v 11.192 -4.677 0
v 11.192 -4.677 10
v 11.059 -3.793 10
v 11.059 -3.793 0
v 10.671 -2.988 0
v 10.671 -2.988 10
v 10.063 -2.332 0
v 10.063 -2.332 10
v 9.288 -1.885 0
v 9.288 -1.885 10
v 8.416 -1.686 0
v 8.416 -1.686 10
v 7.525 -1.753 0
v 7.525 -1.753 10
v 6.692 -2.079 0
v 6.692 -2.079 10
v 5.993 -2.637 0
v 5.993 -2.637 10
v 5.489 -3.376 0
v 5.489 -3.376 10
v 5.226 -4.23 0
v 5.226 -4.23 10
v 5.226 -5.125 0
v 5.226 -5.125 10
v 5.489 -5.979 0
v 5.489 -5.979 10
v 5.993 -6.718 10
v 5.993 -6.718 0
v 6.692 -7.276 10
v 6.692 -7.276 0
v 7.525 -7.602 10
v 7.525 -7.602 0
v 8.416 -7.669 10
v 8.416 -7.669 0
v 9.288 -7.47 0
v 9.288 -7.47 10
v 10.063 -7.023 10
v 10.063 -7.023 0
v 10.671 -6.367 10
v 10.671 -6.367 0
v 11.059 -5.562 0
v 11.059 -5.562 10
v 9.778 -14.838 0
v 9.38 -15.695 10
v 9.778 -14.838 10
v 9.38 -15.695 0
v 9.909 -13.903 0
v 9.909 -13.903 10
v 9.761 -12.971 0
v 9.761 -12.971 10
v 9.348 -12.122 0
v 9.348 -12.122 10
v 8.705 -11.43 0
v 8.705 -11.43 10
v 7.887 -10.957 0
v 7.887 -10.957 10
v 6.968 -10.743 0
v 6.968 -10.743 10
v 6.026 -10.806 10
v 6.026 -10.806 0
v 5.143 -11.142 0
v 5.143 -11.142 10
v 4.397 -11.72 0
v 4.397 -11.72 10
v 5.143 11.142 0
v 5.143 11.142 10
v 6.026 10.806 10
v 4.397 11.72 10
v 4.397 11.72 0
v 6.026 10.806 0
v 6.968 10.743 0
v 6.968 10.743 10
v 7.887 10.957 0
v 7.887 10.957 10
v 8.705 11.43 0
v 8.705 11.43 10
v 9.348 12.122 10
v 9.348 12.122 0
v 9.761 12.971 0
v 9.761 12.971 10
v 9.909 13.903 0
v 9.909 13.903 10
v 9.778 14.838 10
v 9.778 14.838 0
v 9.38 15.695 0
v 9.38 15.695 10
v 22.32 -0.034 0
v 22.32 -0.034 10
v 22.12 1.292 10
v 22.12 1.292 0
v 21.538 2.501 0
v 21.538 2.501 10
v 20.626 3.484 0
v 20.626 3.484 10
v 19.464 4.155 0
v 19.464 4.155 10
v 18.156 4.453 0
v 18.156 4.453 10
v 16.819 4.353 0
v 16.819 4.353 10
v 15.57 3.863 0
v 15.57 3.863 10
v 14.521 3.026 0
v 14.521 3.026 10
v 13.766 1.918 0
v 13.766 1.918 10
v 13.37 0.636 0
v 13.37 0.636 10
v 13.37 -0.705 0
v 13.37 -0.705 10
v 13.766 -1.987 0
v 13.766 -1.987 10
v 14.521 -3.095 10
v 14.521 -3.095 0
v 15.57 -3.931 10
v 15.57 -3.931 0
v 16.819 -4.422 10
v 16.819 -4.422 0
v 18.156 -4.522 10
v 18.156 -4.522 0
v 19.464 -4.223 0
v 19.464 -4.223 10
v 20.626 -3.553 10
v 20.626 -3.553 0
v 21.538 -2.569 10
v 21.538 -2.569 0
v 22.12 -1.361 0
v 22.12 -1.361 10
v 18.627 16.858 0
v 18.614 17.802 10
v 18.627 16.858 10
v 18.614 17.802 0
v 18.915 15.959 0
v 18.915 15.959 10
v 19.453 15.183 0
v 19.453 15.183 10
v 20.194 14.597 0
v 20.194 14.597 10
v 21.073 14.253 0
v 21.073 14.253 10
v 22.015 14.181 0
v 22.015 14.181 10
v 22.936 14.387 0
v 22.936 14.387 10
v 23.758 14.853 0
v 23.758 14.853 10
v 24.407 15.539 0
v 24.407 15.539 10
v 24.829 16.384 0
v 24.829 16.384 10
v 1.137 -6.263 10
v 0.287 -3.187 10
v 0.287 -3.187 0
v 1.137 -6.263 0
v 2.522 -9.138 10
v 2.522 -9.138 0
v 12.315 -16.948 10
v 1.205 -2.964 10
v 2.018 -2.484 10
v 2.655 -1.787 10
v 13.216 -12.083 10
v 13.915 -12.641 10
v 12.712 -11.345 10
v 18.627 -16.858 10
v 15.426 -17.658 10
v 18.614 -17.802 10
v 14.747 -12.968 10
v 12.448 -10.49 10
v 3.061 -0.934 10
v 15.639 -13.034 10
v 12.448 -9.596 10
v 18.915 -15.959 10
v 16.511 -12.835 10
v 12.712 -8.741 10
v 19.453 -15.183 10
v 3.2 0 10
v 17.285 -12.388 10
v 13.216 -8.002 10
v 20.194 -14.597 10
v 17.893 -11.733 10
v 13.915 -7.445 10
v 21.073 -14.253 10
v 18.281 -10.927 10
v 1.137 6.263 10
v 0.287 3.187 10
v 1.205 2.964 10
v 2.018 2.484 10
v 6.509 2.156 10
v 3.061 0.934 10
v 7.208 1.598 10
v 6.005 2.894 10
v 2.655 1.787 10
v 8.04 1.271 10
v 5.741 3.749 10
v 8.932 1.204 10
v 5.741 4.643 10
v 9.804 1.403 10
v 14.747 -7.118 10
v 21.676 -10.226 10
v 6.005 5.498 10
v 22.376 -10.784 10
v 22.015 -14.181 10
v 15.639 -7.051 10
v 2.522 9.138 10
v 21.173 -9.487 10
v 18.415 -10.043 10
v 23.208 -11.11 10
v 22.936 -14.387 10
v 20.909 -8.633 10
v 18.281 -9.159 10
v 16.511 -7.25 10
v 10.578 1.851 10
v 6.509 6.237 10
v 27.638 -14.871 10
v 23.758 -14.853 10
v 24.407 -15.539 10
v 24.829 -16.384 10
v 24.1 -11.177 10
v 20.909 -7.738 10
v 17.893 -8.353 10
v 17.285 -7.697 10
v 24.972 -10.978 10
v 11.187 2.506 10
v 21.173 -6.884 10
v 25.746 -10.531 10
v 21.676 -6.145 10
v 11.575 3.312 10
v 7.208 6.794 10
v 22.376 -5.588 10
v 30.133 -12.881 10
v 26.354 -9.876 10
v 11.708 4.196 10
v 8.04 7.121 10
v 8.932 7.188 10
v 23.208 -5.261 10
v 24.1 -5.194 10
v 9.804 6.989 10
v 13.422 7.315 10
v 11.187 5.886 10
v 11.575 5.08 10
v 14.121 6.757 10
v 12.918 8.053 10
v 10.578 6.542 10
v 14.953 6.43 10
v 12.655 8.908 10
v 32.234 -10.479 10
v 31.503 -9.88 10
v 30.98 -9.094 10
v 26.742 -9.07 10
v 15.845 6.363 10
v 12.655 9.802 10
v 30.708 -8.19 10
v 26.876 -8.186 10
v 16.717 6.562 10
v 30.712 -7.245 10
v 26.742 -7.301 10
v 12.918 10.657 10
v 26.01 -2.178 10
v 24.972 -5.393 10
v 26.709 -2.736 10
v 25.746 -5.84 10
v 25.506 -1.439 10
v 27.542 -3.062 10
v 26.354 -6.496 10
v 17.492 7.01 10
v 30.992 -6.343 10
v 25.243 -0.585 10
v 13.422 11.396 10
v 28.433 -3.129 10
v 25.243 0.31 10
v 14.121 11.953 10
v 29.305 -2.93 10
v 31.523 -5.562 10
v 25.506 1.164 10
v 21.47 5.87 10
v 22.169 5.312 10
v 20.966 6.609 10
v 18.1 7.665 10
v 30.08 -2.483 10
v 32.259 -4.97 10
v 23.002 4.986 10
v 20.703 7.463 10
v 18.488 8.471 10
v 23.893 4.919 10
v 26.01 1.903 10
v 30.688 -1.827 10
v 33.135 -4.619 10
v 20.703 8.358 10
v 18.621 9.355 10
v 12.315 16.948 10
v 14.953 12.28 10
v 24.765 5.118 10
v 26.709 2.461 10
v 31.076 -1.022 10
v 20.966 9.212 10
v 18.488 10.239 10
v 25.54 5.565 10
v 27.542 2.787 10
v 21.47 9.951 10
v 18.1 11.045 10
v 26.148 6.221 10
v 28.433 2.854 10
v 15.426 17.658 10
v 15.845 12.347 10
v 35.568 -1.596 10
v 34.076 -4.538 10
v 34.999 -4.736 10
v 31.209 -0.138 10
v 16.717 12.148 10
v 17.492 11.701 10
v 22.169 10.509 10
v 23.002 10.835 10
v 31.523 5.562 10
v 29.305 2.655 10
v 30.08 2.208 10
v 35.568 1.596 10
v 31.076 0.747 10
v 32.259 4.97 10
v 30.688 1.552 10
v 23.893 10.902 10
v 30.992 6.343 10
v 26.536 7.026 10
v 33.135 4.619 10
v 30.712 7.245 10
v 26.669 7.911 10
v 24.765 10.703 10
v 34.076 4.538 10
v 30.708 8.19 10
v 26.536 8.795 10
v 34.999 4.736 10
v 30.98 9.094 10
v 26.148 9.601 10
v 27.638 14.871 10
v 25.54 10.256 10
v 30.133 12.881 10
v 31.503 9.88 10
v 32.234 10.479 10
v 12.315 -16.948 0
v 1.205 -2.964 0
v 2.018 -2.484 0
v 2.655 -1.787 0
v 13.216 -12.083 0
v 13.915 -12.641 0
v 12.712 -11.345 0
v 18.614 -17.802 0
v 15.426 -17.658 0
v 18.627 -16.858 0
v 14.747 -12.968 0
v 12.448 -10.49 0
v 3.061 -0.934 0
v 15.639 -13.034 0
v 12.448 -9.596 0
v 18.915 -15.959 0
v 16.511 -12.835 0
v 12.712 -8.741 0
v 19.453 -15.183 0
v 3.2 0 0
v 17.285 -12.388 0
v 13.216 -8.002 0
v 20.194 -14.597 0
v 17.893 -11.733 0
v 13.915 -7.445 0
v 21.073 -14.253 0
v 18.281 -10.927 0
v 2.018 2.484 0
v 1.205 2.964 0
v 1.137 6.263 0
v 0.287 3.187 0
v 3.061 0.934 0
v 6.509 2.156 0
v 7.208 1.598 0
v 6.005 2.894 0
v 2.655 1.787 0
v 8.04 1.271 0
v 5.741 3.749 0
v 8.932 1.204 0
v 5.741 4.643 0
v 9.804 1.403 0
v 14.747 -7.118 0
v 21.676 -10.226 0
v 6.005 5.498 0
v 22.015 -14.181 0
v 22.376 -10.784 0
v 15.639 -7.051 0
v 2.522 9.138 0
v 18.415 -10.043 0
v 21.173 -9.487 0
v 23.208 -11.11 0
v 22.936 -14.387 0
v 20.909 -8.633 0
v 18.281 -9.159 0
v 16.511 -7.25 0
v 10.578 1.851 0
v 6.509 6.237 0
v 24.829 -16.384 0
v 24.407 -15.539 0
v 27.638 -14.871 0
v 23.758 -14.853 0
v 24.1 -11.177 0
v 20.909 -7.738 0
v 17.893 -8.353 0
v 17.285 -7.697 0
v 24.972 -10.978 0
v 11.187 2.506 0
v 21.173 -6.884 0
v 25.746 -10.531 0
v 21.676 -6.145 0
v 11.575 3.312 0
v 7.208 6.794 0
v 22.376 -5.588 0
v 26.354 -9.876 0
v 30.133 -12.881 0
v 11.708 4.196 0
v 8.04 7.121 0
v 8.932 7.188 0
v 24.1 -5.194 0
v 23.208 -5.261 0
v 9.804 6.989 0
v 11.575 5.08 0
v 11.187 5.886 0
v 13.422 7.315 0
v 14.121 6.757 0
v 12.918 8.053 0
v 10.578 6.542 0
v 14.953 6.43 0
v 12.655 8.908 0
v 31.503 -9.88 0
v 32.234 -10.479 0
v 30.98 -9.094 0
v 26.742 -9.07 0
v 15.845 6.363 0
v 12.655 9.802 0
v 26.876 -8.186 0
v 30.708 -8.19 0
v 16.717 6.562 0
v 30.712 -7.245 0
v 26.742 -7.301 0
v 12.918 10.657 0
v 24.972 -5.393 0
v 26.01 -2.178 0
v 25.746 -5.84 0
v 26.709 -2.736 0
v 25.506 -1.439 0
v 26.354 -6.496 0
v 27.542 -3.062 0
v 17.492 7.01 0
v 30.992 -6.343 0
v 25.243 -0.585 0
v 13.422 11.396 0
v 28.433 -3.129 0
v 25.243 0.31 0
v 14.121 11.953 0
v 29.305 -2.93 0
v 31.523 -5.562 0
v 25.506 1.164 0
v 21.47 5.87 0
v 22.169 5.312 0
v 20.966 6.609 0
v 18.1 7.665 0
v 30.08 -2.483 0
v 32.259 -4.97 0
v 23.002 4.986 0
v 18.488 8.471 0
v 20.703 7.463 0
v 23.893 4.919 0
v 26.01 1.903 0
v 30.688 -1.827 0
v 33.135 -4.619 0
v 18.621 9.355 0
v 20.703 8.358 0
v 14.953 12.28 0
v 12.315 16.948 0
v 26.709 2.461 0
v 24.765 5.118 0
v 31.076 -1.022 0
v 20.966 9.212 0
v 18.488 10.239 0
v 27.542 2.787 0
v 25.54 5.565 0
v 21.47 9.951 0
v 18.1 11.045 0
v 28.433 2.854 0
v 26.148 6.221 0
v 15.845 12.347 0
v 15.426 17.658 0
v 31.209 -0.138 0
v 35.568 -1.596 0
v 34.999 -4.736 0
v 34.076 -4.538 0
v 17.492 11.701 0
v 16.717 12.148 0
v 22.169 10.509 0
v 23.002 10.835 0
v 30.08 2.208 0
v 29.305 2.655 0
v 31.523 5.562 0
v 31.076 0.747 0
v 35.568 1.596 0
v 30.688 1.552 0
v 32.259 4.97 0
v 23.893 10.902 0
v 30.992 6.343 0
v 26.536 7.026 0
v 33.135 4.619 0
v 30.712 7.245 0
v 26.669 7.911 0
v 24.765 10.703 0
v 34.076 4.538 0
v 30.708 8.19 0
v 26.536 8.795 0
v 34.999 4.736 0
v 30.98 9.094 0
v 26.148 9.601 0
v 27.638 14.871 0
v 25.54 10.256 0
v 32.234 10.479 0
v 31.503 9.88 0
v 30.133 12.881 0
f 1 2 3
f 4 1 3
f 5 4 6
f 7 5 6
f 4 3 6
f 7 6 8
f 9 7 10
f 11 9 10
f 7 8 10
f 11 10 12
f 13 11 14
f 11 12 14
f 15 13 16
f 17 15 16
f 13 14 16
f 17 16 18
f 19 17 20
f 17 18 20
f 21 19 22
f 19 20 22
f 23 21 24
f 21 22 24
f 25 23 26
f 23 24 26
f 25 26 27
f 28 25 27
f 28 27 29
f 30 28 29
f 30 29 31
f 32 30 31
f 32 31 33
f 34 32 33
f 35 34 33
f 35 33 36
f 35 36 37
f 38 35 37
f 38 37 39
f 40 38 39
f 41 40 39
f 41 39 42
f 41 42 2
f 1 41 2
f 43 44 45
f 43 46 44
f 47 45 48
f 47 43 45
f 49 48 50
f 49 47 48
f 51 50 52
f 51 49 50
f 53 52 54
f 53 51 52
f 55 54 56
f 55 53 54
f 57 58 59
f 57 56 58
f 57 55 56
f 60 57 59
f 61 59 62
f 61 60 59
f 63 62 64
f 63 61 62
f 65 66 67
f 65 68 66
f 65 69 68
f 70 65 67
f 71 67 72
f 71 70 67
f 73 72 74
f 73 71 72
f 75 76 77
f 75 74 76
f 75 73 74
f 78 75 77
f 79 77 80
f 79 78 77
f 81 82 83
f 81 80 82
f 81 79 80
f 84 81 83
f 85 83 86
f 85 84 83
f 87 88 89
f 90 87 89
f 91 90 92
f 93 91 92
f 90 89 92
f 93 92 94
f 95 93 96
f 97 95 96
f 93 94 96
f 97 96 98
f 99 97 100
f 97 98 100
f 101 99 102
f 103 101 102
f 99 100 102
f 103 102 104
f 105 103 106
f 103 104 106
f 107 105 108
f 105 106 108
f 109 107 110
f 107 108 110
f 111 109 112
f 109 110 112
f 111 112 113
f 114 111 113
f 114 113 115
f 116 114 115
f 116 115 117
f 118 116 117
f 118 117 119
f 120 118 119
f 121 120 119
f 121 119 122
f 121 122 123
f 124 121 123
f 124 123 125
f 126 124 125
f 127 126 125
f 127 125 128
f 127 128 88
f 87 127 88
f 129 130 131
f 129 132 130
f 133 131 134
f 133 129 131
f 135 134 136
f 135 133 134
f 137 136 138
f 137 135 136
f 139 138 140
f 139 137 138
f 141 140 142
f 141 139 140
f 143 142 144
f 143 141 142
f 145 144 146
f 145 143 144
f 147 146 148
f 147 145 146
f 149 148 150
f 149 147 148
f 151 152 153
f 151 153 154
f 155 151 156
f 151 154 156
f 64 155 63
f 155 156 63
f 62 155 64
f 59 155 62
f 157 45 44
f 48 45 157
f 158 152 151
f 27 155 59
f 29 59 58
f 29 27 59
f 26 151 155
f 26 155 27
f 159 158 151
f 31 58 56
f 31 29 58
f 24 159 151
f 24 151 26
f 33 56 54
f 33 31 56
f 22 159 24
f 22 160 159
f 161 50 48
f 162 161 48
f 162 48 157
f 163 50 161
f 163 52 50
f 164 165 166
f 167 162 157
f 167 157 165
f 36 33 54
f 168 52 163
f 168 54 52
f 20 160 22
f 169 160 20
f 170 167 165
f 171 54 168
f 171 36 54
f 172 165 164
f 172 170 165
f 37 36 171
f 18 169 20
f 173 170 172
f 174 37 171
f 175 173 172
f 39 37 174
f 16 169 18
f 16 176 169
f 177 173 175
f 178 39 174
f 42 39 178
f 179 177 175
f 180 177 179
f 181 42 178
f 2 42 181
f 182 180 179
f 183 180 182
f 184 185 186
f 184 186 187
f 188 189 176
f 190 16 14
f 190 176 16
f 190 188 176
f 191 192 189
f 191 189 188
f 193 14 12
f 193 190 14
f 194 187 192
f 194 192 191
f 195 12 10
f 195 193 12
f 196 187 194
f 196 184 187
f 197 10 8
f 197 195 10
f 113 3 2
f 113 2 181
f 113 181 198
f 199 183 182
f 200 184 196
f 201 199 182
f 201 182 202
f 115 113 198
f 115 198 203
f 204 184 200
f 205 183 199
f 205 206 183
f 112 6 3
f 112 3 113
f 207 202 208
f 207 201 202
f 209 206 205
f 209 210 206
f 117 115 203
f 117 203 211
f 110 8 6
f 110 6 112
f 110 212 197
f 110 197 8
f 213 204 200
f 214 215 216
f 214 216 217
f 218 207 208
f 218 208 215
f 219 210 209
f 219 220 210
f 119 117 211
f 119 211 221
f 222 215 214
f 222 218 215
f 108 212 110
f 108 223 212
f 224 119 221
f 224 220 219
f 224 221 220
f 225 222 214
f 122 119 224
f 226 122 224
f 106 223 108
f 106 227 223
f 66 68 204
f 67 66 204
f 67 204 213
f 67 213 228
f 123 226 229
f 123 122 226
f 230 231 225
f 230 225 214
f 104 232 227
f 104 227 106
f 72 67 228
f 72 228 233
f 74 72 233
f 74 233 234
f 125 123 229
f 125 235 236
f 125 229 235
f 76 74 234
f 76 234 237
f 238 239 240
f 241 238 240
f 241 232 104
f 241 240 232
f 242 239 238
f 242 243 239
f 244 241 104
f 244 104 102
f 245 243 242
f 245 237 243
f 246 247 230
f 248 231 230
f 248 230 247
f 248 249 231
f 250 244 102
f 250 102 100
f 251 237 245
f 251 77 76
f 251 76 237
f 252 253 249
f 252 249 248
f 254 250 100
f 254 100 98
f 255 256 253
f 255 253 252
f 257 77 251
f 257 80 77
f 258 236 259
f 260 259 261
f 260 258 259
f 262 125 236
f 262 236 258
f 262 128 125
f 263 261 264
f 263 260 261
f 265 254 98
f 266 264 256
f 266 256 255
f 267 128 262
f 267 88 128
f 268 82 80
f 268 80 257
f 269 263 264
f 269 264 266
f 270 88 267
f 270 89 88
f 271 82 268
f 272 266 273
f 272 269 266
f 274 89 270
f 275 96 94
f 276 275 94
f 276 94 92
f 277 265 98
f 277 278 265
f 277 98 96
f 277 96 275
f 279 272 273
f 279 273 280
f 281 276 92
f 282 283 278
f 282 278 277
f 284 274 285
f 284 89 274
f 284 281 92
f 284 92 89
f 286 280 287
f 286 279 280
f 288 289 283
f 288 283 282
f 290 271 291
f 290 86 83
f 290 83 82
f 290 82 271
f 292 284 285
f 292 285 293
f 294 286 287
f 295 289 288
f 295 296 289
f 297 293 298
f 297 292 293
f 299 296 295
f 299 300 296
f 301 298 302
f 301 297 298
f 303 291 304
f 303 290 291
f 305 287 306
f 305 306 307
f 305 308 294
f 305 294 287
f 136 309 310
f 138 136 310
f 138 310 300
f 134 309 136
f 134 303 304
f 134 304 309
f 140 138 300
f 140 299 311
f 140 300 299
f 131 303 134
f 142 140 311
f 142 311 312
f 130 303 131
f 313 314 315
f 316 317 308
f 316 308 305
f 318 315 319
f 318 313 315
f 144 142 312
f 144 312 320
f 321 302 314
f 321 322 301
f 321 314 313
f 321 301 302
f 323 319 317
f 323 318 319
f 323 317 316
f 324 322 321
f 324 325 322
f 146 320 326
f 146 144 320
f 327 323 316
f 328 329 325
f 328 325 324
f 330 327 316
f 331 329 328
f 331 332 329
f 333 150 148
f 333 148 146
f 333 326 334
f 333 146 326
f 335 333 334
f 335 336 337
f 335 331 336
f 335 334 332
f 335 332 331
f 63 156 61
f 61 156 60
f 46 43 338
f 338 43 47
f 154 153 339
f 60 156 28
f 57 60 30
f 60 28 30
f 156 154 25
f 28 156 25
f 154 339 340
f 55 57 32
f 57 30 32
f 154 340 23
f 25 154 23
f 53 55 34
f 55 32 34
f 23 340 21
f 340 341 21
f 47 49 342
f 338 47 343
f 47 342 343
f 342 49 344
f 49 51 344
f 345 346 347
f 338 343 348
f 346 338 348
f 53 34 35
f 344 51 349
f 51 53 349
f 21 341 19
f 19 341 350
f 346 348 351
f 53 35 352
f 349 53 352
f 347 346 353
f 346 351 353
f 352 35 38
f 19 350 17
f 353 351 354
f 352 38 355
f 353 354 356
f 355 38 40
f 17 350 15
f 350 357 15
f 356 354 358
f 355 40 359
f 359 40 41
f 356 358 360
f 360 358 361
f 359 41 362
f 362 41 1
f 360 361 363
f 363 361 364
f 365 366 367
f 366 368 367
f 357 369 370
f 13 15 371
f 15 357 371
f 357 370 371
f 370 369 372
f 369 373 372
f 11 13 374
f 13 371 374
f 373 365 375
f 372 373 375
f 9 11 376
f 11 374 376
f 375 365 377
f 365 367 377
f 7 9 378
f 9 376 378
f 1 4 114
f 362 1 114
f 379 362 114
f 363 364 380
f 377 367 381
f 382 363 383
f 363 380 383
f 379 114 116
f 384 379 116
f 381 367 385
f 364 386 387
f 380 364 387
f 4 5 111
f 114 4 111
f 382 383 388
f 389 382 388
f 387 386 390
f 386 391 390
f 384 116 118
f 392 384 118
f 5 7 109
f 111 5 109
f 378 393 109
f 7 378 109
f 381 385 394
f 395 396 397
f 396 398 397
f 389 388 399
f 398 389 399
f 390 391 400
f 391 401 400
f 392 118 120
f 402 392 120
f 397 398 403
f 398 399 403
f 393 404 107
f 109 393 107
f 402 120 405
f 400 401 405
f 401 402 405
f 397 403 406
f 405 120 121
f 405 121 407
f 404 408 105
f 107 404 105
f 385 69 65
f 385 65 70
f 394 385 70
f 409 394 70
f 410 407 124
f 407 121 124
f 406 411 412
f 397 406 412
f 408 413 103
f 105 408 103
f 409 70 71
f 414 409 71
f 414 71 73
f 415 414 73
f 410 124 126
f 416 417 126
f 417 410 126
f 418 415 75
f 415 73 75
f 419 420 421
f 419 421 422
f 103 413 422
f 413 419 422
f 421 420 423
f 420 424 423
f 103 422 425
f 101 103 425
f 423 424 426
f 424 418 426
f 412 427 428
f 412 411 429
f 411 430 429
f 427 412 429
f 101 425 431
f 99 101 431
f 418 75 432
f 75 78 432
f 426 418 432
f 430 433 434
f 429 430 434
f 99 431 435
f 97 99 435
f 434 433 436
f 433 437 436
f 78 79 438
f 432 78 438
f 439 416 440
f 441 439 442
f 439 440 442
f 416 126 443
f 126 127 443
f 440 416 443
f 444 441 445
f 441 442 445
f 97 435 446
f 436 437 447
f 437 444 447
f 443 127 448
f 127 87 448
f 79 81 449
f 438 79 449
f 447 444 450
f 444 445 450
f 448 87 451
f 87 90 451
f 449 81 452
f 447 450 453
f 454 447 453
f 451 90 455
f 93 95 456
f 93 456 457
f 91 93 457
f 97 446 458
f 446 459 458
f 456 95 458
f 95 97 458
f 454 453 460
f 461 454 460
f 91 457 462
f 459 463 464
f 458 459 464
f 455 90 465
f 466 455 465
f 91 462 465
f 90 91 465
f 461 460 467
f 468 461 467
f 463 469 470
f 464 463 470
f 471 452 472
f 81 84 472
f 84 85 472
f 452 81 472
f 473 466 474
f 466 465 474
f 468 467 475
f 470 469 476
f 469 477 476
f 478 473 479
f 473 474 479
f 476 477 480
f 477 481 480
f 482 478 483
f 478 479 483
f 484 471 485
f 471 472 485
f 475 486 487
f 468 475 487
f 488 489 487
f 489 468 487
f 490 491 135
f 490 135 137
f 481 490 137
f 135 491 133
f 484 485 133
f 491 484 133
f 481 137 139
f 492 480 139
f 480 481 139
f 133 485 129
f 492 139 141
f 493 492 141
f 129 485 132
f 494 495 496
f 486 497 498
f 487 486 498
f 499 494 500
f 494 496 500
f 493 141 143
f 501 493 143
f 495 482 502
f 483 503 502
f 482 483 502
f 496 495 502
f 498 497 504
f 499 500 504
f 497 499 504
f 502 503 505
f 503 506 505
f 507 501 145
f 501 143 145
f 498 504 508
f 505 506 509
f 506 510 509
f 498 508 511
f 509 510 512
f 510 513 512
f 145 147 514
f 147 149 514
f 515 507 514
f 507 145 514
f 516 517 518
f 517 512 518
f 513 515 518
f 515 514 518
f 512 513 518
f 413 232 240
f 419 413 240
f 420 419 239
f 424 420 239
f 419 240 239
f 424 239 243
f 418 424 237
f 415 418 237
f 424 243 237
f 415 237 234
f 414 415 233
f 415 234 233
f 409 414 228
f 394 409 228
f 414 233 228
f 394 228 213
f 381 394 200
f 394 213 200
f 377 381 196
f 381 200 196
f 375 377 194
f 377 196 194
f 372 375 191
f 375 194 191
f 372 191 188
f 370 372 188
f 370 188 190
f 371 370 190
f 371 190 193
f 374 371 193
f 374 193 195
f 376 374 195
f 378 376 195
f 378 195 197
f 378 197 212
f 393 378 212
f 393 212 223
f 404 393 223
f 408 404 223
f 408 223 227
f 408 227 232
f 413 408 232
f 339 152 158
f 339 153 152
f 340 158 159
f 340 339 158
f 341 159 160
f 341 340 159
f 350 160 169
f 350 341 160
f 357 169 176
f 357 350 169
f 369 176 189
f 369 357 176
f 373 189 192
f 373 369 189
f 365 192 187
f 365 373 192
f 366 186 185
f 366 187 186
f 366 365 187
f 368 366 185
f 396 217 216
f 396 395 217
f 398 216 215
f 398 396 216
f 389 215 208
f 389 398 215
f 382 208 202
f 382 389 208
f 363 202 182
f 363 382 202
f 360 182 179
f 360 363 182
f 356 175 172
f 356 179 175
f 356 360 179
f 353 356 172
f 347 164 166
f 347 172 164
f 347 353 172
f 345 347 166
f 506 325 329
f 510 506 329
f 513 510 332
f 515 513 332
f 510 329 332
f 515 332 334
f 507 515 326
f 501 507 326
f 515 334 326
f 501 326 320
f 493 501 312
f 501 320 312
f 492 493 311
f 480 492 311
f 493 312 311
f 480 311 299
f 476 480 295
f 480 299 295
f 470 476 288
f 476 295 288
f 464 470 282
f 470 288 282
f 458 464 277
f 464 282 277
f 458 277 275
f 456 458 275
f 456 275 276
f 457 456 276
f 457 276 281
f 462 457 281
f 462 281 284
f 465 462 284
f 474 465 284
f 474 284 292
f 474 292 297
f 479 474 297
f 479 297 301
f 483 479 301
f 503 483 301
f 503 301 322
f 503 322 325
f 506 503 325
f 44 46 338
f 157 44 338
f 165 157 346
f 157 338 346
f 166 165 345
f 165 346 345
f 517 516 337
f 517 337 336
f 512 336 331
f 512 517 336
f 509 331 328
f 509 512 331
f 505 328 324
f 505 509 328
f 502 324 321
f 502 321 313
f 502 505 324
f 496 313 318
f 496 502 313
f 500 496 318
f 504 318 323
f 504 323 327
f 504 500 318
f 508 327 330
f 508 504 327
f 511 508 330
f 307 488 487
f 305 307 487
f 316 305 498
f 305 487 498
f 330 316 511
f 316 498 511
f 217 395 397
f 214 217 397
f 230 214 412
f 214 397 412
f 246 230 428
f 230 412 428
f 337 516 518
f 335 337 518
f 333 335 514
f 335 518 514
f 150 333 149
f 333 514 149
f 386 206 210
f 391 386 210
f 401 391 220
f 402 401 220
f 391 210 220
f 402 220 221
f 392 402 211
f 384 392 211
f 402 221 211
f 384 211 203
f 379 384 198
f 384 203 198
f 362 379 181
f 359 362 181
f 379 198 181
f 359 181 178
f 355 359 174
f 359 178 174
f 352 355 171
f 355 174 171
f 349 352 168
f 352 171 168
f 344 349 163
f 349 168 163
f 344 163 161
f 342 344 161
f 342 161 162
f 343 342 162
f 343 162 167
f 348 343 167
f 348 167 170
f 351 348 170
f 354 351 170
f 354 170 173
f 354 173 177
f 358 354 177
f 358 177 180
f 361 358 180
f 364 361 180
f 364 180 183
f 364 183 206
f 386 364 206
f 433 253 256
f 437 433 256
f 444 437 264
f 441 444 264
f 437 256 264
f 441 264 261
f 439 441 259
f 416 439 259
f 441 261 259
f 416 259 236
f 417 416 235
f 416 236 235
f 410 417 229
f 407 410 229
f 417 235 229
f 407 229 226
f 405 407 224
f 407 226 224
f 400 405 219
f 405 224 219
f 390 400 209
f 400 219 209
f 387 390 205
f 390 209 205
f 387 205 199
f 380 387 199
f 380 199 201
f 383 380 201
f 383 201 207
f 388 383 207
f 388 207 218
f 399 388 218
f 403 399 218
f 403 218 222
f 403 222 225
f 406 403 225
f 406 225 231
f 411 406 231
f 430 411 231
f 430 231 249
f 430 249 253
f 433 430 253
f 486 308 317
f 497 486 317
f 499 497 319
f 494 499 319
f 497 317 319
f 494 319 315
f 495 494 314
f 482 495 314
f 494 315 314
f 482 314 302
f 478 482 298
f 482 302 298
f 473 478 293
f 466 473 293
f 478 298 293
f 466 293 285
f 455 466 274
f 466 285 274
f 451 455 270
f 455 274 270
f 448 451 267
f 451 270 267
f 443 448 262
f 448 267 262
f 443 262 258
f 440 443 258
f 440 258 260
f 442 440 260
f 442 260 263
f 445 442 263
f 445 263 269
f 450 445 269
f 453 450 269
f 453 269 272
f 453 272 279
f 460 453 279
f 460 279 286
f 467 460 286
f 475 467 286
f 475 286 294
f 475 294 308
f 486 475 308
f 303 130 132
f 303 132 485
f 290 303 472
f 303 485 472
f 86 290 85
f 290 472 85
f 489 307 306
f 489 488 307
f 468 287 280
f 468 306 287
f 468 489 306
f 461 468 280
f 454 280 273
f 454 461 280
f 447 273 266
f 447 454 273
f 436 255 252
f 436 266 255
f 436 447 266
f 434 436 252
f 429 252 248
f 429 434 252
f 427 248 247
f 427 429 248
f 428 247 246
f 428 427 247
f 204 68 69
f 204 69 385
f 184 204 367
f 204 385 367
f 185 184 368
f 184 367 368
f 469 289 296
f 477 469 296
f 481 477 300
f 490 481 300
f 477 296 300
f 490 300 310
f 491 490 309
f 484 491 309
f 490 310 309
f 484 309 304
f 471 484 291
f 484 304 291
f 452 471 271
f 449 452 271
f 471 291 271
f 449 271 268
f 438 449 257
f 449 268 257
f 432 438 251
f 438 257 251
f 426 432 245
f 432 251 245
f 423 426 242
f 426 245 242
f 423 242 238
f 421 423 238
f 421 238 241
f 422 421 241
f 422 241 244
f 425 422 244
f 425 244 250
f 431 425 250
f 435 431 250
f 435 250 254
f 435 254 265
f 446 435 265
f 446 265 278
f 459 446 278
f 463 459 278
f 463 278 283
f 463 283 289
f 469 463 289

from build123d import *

# Parameters (mm, degrees)
CYLINDER_R        = 3.2
CYLINDER_DEPTH    = 10
ARRAY_COUNT       = 7
CYLINDER001_R     = 17.82
CYLINDER001_DEPTH = 10
SKETCH001_R       = 4.5
SKETCH001_R_2     = 3
POCKET_DEPTH      = 10.001


with BuildPart() as dientes:
    # Cylinder → Cylinder (new body)
    with BuildSketch(Plane.XY):
        Circle(CYLINDER_R)
    extrude(amount=CYLINDER_DEPTH)

    # Array: Dientes ×7 about axis
    array_axis = Axis((17.82, 0, 0), (0, 0, 1))


with BuildPart() as dientes_1:
    add(dientes.part)
    for i in range(1, ARRAY_COUNT):
        add(dientes.part.rotate(array_axis, i * 360 / ARRAY_COUNT))


with BuildPart() as base001_aligerado_con_agujeros:
    # Cylinder001 → Cylinder001 (new body)
    with BuildSketch(Plane(origin=(17.82, 0, 0), x_dir=(1, 0, 0), z_dir=(0, 0, 1))):
        Circle(CYLINDER001_R)
    extrude(amount=CYLINDER001_DEPTH)

    # Cut: cut Dientes
    add(dientes_1.part, mode=Mode.SUBTRACT)

    # Sketch001 → Pocket (cut, through all)
    with BuildSketch(Plane.XY.offset(10)):
        with Locations((17.82, -0.034345)):
            Circle(SKETCH001_R)
        with Locations((15.621058, 9.35508)):
            Circle(SKETCH001_R_2)
        with Locations((23.669142, 7.910553)):
            Circle(SKETCH001_R_2)
        with Locations((28.209085, -0.137526)):
            Circle(SKETCH001_R_2)
        with Locations((23.875502, -8.185606)):
            Circle(SKETCH001_R_2)
        with Locations((15.414699, -10.042854)):
            Circle(SKETCH001_R_2)
        with Locations((8.192065, -4.677468)):
            Circle(SKETCH001_R_2)
        with Locations((8.707965, 4.196056)):
            Circle(SKETCH001_R_2)
    extrude(amount=-POCKET_DEPTH, mode=Mode.SUBTRACT)


solid = base001_aligerado_con_agujeros.part
